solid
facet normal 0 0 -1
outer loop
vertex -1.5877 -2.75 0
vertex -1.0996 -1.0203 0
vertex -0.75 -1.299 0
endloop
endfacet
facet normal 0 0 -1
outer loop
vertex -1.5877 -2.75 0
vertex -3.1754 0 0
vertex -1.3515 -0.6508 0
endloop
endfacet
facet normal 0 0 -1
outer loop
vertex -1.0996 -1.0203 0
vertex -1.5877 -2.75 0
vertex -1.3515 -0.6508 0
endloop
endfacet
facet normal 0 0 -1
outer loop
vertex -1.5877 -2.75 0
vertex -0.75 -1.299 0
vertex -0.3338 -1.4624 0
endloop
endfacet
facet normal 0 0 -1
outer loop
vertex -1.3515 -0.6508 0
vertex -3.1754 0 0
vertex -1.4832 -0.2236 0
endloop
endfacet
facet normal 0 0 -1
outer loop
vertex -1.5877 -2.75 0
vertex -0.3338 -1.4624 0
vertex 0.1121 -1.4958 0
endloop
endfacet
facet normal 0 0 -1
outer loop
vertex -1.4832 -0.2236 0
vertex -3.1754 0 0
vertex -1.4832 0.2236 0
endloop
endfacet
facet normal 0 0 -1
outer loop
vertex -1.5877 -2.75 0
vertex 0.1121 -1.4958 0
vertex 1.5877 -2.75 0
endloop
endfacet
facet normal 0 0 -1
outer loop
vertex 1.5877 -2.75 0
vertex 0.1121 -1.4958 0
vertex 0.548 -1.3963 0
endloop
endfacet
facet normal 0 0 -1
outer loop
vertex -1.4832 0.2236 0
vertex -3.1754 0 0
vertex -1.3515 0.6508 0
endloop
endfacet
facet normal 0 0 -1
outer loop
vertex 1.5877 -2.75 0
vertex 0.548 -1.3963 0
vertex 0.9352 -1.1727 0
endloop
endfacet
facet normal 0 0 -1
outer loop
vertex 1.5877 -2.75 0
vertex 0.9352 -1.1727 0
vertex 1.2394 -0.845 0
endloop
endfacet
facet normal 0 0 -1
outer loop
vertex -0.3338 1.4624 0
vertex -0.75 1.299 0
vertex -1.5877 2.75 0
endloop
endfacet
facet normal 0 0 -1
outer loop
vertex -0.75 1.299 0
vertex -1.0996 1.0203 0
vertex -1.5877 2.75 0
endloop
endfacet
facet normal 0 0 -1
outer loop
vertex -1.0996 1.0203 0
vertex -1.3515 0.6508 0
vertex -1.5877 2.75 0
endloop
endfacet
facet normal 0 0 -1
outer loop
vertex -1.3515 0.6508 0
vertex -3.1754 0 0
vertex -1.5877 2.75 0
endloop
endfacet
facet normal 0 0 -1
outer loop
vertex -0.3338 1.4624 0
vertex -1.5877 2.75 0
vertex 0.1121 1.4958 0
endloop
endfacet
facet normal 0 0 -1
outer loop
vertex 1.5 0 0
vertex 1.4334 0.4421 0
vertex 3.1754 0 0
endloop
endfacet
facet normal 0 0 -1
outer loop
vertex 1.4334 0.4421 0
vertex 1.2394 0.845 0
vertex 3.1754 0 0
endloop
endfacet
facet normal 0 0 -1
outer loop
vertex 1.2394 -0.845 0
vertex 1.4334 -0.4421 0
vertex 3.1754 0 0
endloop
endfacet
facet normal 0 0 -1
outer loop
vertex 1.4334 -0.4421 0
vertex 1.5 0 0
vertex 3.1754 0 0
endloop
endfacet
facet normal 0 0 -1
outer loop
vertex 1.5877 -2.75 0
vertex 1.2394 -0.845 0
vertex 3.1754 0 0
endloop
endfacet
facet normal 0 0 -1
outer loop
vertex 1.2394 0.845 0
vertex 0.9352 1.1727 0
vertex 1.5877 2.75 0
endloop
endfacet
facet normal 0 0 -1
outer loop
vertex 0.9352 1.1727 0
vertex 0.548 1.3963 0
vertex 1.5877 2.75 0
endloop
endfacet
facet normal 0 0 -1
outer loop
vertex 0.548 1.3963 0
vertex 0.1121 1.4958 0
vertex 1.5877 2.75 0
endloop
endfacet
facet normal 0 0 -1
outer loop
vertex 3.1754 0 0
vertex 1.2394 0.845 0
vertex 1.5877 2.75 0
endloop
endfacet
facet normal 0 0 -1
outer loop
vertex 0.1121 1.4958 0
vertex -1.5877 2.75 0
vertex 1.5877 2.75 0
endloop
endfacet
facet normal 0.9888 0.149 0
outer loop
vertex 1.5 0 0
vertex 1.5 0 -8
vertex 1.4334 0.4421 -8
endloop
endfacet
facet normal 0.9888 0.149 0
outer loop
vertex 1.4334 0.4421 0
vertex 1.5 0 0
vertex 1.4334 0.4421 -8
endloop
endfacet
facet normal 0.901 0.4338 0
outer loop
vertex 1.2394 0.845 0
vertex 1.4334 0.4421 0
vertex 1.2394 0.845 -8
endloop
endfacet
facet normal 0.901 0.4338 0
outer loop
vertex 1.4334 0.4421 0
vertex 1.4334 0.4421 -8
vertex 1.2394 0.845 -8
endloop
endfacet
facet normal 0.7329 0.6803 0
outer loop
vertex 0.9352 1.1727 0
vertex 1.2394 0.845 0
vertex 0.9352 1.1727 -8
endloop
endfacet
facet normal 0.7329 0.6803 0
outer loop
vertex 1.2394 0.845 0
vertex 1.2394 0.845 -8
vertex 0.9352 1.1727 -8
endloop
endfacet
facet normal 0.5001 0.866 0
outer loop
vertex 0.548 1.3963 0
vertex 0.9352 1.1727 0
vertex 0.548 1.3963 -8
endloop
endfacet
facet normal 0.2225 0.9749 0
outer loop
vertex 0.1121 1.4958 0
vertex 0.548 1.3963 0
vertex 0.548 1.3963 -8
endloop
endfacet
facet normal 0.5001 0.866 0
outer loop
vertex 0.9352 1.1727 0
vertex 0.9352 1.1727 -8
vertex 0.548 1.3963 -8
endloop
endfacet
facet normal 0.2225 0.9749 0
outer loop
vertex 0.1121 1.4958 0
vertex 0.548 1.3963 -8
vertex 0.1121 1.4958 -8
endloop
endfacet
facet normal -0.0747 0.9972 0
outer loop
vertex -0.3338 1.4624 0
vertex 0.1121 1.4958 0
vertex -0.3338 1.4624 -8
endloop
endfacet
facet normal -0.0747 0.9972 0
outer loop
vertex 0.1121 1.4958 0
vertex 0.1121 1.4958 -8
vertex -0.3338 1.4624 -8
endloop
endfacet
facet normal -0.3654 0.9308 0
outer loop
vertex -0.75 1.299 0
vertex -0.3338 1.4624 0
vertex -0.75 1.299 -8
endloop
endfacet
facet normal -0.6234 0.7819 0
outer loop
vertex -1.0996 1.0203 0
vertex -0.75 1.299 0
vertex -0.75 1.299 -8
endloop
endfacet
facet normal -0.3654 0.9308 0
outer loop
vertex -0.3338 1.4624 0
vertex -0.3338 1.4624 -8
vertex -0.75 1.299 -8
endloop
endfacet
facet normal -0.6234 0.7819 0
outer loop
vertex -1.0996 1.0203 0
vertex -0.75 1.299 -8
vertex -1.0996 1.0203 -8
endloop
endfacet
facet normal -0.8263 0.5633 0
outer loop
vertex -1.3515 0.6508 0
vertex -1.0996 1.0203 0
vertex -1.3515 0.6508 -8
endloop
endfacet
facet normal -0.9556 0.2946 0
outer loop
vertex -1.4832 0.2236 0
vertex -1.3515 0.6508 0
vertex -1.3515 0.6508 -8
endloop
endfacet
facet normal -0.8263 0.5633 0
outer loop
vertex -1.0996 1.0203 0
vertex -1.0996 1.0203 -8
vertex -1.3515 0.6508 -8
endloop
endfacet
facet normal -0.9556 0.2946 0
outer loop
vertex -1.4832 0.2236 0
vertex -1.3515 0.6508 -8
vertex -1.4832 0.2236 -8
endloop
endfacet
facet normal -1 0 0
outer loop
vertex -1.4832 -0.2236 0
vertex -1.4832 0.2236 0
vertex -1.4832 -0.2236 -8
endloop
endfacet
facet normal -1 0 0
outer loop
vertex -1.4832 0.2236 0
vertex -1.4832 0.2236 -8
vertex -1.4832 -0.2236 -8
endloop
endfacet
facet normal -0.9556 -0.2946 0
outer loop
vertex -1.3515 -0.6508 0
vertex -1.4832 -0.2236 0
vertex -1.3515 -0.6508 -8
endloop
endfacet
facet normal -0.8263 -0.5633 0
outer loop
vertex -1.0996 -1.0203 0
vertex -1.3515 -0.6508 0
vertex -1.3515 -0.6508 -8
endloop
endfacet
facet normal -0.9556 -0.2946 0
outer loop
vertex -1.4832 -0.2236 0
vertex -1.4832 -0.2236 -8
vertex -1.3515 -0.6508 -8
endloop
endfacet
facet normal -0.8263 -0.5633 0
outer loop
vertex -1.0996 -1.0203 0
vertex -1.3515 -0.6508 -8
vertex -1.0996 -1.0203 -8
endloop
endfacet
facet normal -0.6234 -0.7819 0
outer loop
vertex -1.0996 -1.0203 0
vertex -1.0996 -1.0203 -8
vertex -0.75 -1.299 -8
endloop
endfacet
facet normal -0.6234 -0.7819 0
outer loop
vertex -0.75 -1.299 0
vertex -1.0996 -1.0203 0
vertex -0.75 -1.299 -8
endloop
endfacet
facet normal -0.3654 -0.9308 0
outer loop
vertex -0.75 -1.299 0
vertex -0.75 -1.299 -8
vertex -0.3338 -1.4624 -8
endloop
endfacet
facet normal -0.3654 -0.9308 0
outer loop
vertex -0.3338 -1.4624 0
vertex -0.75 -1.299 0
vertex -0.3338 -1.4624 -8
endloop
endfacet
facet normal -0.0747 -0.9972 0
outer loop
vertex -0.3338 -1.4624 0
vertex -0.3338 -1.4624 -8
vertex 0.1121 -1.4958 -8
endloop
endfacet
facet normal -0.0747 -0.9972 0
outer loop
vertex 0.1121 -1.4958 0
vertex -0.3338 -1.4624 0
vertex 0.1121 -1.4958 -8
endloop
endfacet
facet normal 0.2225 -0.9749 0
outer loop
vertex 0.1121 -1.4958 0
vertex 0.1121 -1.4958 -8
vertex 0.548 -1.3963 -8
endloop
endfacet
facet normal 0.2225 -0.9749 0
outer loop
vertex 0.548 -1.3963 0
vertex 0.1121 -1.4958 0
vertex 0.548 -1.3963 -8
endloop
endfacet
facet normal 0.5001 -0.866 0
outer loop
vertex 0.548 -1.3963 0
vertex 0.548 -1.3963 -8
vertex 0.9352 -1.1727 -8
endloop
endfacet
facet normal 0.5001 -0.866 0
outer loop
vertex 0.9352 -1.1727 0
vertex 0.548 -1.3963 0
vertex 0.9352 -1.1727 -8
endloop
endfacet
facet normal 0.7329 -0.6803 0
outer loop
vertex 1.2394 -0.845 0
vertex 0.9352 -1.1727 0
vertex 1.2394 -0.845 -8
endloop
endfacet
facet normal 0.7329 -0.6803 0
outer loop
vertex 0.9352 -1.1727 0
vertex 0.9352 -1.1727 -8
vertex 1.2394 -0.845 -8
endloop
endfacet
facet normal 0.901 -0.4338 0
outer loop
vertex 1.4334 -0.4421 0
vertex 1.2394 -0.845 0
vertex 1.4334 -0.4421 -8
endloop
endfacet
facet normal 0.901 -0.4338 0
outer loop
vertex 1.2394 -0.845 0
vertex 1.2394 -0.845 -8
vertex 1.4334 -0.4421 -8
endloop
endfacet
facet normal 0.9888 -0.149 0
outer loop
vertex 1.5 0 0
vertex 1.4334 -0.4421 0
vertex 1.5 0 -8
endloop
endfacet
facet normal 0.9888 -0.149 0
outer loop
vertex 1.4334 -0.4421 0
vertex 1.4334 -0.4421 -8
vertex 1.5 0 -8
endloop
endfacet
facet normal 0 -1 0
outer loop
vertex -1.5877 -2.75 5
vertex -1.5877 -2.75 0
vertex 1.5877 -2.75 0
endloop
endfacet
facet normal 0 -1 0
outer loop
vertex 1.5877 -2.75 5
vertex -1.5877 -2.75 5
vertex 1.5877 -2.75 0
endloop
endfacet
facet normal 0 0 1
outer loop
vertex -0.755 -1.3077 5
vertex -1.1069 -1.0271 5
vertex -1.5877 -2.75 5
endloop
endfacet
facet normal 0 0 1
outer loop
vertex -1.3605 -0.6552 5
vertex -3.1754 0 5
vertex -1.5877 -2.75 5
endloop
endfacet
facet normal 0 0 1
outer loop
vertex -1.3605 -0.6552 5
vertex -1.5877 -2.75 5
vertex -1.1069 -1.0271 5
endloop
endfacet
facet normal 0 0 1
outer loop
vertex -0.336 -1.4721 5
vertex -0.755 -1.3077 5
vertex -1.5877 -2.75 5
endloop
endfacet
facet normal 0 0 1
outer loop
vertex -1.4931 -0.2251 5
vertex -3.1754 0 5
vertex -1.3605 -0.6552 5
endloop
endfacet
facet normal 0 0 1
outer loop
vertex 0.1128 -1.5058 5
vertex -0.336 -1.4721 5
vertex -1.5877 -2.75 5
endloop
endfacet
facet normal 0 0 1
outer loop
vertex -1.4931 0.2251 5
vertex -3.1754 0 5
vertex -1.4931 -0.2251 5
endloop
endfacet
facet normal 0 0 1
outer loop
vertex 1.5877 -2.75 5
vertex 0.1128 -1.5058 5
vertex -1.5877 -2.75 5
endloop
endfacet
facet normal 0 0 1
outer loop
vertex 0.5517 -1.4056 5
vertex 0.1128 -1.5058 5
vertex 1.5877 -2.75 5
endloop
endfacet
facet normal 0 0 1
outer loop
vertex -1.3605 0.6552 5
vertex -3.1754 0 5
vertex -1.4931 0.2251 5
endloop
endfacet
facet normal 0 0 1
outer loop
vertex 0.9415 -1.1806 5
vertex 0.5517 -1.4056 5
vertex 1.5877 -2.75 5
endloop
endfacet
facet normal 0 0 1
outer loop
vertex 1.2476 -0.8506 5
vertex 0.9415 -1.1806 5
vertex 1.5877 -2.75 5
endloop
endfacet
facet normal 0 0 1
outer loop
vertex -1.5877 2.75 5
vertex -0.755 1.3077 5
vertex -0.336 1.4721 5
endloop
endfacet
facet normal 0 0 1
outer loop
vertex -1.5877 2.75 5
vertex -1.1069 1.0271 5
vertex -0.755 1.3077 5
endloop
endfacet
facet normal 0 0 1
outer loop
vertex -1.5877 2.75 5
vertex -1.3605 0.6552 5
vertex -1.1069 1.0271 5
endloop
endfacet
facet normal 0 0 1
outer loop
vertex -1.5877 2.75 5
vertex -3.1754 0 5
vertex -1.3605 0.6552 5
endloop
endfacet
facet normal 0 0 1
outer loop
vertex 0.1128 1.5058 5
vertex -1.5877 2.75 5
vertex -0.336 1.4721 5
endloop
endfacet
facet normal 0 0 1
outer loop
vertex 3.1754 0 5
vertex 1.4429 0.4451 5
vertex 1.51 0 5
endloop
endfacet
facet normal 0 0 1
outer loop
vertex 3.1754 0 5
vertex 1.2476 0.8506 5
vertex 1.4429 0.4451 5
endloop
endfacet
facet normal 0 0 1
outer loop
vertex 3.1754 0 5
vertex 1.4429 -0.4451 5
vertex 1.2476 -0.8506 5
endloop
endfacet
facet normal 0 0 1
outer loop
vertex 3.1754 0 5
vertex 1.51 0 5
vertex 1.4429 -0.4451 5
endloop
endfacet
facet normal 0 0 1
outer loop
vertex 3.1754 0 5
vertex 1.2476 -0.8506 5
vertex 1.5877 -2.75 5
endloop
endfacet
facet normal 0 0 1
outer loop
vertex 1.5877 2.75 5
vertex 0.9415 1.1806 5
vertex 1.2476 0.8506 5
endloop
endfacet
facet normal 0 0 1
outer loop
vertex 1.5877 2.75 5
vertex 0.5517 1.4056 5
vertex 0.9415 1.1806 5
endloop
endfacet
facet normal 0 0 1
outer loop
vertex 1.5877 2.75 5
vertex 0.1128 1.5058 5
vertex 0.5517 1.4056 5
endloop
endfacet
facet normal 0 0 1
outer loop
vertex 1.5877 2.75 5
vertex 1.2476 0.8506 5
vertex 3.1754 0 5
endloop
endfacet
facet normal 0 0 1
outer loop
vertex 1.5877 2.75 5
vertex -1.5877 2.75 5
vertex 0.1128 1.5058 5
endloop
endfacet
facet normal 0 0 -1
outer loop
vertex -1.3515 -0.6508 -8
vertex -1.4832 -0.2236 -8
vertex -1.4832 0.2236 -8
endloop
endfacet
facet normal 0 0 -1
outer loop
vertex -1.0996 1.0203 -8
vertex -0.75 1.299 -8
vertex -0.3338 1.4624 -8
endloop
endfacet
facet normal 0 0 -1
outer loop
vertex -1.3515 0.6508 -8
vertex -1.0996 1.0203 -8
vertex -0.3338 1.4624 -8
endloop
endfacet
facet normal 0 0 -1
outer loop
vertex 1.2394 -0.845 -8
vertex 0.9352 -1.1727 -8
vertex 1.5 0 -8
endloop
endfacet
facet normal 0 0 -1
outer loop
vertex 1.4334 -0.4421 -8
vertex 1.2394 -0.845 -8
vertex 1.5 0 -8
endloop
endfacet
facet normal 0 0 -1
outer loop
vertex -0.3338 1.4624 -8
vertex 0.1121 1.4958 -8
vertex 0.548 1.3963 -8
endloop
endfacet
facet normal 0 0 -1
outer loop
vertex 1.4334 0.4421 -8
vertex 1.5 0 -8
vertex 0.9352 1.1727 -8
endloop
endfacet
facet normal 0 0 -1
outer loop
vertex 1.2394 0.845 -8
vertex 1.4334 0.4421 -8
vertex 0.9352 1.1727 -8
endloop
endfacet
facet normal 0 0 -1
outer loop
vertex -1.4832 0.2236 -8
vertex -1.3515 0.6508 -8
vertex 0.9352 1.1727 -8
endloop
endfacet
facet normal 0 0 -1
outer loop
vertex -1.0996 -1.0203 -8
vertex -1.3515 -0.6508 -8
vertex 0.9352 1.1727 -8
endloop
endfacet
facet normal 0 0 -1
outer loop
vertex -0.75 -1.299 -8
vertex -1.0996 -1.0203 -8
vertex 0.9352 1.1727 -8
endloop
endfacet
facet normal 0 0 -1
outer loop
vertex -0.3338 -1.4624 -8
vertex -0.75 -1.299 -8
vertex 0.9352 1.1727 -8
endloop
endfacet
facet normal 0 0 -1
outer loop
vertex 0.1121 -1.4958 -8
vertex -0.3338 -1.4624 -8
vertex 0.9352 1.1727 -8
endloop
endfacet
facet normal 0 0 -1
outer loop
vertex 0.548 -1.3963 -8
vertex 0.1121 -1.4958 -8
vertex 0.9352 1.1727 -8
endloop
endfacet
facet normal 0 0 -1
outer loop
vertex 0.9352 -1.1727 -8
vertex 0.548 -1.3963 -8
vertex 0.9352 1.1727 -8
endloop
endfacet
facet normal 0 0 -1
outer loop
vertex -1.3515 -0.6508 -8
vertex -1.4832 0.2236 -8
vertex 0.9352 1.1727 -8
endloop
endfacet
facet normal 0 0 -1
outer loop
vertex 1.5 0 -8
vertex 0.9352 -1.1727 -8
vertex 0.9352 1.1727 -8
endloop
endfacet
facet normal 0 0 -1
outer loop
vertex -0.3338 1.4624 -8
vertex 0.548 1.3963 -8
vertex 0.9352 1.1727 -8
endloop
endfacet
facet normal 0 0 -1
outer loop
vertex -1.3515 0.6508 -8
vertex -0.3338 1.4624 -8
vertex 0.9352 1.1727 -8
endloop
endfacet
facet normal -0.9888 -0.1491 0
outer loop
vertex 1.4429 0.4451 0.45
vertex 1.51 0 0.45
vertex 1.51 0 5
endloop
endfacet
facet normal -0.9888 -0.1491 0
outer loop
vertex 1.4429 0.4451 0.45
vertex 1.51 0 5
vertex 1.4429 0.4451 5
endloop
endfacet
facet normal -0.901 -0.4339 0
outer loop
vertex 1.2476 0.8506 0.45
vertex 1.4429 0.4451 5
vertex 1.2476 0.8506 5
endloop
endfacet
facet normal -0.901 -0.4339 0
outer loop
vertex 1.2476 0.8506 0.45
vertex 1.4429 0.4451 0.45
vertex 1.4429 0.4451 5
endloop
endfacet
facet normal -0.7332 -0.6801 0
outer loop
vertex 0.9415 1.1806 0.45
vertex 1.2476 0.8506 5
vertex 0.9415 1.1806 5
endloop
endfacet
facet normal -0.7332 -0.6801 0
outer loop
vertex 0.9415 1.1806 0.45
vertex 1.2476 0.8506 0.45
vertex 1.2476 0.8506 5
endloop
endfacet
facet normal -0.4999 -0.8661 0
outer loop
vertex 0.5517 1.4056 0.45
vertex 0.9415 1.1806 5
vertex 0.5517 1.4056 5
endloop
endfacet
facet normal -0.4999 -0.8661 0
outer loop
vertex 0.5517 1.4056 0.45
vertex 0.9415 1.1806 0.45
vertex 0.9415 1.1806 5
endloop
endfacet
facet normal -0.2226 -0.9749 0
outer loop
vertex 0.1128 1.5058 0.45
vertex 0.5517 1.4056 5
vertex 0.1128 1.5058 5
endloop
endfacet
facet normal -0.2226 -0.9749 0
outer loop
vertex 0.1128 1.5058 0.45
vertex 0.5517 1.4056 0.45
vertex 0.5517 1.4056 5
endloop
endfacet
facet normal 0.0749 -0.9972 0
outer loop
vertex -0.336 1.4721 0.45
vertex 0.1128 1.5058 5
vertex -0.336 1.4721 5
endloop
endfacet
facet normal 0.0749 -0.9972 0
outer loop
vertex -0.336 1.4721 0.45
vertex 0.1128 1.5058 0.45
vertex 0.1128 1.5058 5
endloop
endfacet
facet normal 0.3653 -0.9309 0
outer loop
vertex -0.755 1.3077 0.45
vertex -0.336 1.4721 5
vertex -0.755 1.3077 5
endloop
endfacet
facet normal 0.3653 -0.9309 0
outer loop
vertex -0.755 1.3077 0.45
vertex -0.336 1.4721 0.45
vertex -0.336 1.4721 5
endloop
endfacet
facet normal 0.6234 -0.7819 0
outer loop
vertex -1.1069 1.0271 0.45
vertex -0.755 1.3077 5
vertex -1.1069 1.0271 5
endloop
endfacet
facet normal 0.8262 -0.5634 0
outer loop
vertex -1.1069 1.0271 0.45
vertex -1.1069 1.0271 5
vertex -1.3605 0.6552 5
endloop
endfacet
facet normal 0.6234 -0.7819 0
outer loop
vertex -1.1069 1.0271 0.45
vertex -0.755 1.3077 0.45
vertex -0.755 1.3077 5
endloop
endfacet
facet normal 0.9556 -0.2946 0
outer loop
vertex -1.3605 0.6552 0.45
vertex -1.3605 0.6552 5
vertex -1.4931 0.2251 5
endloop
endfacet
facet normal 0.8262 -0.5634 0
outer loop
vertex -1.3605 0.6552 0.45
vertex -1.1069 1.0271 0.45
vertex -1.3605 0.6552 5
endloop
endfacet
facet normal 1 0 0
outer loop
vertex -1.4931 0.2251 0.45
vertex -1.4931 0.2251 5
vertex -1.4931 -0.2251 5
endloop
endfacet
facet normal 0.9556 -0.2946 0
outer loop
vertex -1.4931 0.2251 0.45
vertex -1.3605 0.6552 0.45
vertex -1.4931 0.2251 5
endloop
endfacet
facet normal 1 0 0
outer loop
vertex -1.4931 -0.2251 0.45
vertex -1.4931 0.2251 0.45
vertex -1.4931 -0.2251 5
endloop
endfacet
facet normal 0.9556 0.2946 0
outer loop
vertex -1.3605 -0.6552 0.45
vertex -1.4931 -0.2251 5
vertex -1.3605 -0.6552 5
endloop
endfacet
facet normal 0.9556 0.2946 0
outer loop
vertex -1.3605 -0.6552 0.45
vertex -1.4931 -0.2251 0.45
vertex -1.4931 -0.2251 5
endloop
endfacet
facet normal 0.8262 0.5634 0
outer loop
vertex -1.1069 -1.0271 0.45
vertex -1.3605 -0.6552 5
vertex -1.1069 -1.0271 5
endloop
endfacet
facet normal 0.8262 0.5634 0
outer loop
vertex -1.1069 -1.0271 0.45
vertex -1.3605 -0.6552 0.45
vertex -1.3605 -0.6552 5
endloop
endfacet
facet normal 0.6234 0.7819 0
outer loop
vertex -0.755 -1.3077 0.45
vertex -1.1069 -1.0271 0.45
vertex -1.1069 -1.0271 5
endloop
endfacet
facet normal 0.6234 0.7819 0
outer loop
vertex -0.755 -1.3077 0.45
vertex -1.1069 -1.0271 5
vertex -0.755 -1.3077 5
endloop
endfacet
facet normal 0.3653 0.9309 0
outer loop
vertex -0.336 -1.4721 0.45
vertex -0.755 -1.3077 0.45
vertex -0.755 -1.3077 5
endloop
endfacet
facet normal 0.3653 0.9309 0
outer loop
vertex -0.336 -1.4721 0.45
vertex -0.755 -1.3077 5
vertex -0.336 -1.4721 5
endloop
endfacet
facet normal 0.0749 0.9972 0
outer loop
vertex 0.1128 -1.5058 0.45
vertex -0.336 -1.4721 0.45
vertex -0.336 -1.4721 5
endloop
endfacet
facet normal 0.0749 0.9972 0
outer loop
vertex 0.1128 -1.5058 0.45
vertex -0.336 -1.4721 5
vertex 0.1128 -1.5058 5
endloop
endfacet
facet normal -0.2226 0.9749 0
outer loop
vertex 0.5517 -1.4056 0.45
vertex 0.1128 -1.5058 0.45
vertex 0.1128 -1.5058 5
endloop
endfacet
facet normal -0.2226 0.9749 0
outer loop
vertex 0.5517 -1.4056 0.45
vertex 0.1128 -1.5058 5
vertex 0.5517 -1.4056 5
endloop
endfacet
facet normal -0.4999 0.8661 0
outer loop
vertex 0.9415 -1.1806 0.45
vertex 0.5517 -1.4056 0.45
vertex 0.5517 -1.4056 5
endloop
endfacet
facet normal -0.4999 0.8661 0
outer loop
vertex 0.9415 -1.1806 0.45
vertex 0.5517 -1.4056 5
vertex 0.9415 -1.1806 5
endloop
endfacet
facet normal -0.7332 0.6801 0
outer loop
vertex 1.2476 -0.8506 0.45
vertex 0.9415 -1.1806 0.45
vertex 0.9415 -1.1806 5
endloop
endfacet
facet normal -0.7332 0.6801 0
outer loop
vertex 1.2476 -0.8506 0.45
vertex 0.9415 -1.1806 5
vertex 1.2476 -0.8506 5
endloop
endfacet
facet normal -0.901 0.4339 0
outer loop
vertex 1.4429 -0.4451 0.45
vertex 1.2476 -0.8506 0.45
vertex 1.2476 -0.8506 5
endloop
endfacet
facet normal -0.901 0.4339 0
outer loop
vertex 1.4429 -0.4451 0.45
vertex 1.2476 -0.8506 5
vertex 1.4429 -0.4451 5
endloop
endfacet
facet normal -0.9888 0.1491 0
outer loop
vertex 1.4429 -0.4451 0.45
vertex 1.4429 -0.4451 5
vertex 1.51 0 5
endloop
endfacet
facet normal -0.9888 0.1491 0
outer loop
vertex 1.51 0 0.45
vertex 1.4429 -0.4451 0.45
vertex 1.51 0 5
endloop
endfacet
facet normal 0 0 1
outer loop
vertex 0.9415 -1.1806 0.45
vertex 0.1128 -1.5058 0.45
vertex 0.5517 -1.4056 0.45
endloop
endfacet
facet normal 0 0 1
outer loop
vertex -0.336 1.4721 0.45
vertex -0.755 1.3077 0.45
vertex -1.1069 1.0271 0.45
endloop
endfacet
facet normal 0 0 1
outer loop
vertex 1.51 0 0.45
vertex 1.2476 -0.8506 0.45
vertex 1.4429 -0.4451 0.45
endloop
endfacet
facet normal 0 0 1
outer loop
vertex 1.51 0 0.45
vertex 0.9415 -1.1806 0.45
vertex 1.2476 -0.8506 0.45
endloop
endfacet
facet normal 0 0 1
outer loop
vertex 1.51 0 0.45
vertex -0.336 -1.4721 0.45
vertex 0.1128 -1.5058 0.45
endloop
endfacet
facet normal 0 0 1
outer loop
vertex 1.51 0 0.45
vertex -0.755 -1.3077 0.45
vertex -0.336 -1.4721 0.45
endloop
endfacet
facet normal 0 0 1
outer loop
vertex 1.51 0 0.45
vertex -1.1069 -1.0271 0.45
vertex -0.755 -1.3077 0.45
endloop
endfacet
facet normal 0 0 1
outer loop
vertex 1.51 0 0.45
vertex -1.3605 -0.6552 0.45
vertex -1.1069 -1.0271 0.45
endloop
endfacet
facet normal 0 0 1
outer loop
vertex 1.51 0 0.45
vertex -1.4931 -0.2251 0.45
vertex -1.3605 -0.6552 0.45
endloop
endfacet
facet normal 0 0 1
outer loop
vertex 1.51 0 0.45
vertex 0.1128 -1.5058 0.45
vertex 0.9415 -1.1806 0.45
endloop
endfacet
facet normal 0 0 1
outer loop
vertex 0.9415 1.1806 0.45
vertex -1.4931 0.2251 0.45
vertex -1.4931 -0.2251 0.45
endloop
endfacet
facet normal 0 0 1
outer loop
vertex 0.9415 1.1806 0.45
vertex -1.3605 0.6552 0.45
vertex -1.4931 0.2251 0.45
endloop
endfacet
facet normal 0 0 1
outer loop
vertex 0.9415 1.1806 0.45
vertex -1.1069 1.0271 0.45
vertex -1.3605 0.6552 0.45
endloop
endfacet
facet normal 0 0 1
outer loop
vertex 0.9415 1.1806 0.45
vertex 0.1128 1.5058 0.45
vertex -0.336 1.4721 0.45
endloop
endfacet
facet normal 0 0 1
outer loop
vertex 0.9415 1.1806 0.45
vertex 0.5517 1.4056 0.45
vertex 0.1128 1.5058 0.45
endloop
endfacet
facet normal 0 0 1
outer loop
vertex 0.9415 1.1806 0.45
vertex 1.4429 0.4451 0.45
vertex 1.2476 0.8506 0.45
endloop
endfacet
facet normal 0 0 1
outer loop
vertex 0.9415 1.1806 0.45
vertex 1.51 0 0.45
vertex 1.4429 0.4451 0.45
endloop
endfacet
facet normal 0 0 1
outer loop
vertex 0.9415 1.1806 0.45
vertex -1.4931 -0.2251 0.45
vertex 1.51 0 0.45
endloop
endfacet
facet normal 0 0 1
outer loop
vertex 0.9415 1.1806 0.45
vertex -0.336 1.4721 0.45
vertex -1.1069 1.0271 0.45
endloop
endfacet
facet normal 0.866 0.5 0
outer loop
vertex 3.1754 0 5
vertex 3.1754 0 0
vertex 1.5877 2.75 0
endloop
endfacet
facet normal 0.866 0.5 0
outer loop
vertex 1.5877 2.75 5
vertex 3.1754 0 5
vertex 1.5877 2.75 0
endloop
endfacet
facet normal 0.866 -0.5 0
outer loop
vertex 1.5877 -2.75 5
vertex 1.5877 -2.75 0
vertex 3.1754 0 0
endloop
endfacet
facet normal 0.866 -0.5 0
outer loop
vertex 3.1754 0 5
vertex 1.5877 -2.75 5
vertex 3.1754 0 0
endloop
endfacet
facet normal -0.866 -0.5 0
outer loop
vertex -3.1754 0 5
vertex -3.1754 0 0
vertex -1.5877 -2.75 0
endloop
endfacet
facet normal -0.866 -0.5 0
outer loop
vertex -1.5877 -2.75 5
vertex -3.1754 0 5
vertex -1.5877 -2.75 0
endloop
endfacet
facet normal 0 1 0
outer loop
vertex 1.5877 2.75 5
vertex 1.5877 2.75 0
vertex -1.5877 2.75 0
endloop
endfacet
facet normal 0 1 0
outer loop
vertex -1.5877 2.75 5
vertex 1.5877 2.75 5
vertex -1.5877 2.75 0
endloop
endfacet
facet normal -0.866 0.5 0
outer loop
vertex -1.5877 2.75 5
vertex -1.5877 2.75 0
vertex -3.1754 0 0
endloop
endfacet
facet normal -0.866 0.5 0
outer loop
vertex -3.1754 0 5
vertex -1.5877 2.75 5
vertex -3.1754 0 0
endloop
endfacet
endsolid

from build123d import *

# Parameters (mm, degrees)
FEMALE_HEX_STANDOFF_SKETCH_R  = 1.51
FEMALE_HEX_STANDOFF_DEPTH     = 5
STUD_ROOT_SKETCH_R            = 1.85
STUD_ROOT_DEPTH               = 0.45
MALE_THREAD_ENVELOPE_START    = -8
MALE_THREAD_ENVELOPE_SKETCH_R = 1.5
MALE_THREAD_ENVELOPE_DEPTH    = 8


with BuildPart() as part:
    # Female_hex_standoff_Sketch → Female_hex_standoff (new body)
    with BuildSketch(Plane.XY):
        Polygon((3.175426481, 0), (1.58771324, 2.75), (-1.58771324, 2.75), (-3.175426481, 0), (-1.58771324, -2.75), (1.58771324, -2.75), align=None)
        Circle(FEMALE_HEX_STANDOFF_SKETCH_R, mode=Mode.SUBTRACT)
    extrude(amount=FEMALE_HEX_STANDOFF_DEPTH)

    # Stud_root_Sketch → Stud_root (add)
    with BuildSketch(Plane.XY):
        Circle(STUD_ROOT_SKETCH_R)
    extrude(amount=STUD_ROOT_DEPTH)

    # Male_thread_envelope_Sketch → Male_thread_envelope (add)
    with BuildSketch(Plane.XY.offset(MALE_THREAD_ENVELOPE_START)):
        Circle(MALE_THREAD_ENVELOPE_SKETCH_R)
    extrude(amount=MALE_THREAD_ENVELOPE_DEPTH)


solid = part.part
